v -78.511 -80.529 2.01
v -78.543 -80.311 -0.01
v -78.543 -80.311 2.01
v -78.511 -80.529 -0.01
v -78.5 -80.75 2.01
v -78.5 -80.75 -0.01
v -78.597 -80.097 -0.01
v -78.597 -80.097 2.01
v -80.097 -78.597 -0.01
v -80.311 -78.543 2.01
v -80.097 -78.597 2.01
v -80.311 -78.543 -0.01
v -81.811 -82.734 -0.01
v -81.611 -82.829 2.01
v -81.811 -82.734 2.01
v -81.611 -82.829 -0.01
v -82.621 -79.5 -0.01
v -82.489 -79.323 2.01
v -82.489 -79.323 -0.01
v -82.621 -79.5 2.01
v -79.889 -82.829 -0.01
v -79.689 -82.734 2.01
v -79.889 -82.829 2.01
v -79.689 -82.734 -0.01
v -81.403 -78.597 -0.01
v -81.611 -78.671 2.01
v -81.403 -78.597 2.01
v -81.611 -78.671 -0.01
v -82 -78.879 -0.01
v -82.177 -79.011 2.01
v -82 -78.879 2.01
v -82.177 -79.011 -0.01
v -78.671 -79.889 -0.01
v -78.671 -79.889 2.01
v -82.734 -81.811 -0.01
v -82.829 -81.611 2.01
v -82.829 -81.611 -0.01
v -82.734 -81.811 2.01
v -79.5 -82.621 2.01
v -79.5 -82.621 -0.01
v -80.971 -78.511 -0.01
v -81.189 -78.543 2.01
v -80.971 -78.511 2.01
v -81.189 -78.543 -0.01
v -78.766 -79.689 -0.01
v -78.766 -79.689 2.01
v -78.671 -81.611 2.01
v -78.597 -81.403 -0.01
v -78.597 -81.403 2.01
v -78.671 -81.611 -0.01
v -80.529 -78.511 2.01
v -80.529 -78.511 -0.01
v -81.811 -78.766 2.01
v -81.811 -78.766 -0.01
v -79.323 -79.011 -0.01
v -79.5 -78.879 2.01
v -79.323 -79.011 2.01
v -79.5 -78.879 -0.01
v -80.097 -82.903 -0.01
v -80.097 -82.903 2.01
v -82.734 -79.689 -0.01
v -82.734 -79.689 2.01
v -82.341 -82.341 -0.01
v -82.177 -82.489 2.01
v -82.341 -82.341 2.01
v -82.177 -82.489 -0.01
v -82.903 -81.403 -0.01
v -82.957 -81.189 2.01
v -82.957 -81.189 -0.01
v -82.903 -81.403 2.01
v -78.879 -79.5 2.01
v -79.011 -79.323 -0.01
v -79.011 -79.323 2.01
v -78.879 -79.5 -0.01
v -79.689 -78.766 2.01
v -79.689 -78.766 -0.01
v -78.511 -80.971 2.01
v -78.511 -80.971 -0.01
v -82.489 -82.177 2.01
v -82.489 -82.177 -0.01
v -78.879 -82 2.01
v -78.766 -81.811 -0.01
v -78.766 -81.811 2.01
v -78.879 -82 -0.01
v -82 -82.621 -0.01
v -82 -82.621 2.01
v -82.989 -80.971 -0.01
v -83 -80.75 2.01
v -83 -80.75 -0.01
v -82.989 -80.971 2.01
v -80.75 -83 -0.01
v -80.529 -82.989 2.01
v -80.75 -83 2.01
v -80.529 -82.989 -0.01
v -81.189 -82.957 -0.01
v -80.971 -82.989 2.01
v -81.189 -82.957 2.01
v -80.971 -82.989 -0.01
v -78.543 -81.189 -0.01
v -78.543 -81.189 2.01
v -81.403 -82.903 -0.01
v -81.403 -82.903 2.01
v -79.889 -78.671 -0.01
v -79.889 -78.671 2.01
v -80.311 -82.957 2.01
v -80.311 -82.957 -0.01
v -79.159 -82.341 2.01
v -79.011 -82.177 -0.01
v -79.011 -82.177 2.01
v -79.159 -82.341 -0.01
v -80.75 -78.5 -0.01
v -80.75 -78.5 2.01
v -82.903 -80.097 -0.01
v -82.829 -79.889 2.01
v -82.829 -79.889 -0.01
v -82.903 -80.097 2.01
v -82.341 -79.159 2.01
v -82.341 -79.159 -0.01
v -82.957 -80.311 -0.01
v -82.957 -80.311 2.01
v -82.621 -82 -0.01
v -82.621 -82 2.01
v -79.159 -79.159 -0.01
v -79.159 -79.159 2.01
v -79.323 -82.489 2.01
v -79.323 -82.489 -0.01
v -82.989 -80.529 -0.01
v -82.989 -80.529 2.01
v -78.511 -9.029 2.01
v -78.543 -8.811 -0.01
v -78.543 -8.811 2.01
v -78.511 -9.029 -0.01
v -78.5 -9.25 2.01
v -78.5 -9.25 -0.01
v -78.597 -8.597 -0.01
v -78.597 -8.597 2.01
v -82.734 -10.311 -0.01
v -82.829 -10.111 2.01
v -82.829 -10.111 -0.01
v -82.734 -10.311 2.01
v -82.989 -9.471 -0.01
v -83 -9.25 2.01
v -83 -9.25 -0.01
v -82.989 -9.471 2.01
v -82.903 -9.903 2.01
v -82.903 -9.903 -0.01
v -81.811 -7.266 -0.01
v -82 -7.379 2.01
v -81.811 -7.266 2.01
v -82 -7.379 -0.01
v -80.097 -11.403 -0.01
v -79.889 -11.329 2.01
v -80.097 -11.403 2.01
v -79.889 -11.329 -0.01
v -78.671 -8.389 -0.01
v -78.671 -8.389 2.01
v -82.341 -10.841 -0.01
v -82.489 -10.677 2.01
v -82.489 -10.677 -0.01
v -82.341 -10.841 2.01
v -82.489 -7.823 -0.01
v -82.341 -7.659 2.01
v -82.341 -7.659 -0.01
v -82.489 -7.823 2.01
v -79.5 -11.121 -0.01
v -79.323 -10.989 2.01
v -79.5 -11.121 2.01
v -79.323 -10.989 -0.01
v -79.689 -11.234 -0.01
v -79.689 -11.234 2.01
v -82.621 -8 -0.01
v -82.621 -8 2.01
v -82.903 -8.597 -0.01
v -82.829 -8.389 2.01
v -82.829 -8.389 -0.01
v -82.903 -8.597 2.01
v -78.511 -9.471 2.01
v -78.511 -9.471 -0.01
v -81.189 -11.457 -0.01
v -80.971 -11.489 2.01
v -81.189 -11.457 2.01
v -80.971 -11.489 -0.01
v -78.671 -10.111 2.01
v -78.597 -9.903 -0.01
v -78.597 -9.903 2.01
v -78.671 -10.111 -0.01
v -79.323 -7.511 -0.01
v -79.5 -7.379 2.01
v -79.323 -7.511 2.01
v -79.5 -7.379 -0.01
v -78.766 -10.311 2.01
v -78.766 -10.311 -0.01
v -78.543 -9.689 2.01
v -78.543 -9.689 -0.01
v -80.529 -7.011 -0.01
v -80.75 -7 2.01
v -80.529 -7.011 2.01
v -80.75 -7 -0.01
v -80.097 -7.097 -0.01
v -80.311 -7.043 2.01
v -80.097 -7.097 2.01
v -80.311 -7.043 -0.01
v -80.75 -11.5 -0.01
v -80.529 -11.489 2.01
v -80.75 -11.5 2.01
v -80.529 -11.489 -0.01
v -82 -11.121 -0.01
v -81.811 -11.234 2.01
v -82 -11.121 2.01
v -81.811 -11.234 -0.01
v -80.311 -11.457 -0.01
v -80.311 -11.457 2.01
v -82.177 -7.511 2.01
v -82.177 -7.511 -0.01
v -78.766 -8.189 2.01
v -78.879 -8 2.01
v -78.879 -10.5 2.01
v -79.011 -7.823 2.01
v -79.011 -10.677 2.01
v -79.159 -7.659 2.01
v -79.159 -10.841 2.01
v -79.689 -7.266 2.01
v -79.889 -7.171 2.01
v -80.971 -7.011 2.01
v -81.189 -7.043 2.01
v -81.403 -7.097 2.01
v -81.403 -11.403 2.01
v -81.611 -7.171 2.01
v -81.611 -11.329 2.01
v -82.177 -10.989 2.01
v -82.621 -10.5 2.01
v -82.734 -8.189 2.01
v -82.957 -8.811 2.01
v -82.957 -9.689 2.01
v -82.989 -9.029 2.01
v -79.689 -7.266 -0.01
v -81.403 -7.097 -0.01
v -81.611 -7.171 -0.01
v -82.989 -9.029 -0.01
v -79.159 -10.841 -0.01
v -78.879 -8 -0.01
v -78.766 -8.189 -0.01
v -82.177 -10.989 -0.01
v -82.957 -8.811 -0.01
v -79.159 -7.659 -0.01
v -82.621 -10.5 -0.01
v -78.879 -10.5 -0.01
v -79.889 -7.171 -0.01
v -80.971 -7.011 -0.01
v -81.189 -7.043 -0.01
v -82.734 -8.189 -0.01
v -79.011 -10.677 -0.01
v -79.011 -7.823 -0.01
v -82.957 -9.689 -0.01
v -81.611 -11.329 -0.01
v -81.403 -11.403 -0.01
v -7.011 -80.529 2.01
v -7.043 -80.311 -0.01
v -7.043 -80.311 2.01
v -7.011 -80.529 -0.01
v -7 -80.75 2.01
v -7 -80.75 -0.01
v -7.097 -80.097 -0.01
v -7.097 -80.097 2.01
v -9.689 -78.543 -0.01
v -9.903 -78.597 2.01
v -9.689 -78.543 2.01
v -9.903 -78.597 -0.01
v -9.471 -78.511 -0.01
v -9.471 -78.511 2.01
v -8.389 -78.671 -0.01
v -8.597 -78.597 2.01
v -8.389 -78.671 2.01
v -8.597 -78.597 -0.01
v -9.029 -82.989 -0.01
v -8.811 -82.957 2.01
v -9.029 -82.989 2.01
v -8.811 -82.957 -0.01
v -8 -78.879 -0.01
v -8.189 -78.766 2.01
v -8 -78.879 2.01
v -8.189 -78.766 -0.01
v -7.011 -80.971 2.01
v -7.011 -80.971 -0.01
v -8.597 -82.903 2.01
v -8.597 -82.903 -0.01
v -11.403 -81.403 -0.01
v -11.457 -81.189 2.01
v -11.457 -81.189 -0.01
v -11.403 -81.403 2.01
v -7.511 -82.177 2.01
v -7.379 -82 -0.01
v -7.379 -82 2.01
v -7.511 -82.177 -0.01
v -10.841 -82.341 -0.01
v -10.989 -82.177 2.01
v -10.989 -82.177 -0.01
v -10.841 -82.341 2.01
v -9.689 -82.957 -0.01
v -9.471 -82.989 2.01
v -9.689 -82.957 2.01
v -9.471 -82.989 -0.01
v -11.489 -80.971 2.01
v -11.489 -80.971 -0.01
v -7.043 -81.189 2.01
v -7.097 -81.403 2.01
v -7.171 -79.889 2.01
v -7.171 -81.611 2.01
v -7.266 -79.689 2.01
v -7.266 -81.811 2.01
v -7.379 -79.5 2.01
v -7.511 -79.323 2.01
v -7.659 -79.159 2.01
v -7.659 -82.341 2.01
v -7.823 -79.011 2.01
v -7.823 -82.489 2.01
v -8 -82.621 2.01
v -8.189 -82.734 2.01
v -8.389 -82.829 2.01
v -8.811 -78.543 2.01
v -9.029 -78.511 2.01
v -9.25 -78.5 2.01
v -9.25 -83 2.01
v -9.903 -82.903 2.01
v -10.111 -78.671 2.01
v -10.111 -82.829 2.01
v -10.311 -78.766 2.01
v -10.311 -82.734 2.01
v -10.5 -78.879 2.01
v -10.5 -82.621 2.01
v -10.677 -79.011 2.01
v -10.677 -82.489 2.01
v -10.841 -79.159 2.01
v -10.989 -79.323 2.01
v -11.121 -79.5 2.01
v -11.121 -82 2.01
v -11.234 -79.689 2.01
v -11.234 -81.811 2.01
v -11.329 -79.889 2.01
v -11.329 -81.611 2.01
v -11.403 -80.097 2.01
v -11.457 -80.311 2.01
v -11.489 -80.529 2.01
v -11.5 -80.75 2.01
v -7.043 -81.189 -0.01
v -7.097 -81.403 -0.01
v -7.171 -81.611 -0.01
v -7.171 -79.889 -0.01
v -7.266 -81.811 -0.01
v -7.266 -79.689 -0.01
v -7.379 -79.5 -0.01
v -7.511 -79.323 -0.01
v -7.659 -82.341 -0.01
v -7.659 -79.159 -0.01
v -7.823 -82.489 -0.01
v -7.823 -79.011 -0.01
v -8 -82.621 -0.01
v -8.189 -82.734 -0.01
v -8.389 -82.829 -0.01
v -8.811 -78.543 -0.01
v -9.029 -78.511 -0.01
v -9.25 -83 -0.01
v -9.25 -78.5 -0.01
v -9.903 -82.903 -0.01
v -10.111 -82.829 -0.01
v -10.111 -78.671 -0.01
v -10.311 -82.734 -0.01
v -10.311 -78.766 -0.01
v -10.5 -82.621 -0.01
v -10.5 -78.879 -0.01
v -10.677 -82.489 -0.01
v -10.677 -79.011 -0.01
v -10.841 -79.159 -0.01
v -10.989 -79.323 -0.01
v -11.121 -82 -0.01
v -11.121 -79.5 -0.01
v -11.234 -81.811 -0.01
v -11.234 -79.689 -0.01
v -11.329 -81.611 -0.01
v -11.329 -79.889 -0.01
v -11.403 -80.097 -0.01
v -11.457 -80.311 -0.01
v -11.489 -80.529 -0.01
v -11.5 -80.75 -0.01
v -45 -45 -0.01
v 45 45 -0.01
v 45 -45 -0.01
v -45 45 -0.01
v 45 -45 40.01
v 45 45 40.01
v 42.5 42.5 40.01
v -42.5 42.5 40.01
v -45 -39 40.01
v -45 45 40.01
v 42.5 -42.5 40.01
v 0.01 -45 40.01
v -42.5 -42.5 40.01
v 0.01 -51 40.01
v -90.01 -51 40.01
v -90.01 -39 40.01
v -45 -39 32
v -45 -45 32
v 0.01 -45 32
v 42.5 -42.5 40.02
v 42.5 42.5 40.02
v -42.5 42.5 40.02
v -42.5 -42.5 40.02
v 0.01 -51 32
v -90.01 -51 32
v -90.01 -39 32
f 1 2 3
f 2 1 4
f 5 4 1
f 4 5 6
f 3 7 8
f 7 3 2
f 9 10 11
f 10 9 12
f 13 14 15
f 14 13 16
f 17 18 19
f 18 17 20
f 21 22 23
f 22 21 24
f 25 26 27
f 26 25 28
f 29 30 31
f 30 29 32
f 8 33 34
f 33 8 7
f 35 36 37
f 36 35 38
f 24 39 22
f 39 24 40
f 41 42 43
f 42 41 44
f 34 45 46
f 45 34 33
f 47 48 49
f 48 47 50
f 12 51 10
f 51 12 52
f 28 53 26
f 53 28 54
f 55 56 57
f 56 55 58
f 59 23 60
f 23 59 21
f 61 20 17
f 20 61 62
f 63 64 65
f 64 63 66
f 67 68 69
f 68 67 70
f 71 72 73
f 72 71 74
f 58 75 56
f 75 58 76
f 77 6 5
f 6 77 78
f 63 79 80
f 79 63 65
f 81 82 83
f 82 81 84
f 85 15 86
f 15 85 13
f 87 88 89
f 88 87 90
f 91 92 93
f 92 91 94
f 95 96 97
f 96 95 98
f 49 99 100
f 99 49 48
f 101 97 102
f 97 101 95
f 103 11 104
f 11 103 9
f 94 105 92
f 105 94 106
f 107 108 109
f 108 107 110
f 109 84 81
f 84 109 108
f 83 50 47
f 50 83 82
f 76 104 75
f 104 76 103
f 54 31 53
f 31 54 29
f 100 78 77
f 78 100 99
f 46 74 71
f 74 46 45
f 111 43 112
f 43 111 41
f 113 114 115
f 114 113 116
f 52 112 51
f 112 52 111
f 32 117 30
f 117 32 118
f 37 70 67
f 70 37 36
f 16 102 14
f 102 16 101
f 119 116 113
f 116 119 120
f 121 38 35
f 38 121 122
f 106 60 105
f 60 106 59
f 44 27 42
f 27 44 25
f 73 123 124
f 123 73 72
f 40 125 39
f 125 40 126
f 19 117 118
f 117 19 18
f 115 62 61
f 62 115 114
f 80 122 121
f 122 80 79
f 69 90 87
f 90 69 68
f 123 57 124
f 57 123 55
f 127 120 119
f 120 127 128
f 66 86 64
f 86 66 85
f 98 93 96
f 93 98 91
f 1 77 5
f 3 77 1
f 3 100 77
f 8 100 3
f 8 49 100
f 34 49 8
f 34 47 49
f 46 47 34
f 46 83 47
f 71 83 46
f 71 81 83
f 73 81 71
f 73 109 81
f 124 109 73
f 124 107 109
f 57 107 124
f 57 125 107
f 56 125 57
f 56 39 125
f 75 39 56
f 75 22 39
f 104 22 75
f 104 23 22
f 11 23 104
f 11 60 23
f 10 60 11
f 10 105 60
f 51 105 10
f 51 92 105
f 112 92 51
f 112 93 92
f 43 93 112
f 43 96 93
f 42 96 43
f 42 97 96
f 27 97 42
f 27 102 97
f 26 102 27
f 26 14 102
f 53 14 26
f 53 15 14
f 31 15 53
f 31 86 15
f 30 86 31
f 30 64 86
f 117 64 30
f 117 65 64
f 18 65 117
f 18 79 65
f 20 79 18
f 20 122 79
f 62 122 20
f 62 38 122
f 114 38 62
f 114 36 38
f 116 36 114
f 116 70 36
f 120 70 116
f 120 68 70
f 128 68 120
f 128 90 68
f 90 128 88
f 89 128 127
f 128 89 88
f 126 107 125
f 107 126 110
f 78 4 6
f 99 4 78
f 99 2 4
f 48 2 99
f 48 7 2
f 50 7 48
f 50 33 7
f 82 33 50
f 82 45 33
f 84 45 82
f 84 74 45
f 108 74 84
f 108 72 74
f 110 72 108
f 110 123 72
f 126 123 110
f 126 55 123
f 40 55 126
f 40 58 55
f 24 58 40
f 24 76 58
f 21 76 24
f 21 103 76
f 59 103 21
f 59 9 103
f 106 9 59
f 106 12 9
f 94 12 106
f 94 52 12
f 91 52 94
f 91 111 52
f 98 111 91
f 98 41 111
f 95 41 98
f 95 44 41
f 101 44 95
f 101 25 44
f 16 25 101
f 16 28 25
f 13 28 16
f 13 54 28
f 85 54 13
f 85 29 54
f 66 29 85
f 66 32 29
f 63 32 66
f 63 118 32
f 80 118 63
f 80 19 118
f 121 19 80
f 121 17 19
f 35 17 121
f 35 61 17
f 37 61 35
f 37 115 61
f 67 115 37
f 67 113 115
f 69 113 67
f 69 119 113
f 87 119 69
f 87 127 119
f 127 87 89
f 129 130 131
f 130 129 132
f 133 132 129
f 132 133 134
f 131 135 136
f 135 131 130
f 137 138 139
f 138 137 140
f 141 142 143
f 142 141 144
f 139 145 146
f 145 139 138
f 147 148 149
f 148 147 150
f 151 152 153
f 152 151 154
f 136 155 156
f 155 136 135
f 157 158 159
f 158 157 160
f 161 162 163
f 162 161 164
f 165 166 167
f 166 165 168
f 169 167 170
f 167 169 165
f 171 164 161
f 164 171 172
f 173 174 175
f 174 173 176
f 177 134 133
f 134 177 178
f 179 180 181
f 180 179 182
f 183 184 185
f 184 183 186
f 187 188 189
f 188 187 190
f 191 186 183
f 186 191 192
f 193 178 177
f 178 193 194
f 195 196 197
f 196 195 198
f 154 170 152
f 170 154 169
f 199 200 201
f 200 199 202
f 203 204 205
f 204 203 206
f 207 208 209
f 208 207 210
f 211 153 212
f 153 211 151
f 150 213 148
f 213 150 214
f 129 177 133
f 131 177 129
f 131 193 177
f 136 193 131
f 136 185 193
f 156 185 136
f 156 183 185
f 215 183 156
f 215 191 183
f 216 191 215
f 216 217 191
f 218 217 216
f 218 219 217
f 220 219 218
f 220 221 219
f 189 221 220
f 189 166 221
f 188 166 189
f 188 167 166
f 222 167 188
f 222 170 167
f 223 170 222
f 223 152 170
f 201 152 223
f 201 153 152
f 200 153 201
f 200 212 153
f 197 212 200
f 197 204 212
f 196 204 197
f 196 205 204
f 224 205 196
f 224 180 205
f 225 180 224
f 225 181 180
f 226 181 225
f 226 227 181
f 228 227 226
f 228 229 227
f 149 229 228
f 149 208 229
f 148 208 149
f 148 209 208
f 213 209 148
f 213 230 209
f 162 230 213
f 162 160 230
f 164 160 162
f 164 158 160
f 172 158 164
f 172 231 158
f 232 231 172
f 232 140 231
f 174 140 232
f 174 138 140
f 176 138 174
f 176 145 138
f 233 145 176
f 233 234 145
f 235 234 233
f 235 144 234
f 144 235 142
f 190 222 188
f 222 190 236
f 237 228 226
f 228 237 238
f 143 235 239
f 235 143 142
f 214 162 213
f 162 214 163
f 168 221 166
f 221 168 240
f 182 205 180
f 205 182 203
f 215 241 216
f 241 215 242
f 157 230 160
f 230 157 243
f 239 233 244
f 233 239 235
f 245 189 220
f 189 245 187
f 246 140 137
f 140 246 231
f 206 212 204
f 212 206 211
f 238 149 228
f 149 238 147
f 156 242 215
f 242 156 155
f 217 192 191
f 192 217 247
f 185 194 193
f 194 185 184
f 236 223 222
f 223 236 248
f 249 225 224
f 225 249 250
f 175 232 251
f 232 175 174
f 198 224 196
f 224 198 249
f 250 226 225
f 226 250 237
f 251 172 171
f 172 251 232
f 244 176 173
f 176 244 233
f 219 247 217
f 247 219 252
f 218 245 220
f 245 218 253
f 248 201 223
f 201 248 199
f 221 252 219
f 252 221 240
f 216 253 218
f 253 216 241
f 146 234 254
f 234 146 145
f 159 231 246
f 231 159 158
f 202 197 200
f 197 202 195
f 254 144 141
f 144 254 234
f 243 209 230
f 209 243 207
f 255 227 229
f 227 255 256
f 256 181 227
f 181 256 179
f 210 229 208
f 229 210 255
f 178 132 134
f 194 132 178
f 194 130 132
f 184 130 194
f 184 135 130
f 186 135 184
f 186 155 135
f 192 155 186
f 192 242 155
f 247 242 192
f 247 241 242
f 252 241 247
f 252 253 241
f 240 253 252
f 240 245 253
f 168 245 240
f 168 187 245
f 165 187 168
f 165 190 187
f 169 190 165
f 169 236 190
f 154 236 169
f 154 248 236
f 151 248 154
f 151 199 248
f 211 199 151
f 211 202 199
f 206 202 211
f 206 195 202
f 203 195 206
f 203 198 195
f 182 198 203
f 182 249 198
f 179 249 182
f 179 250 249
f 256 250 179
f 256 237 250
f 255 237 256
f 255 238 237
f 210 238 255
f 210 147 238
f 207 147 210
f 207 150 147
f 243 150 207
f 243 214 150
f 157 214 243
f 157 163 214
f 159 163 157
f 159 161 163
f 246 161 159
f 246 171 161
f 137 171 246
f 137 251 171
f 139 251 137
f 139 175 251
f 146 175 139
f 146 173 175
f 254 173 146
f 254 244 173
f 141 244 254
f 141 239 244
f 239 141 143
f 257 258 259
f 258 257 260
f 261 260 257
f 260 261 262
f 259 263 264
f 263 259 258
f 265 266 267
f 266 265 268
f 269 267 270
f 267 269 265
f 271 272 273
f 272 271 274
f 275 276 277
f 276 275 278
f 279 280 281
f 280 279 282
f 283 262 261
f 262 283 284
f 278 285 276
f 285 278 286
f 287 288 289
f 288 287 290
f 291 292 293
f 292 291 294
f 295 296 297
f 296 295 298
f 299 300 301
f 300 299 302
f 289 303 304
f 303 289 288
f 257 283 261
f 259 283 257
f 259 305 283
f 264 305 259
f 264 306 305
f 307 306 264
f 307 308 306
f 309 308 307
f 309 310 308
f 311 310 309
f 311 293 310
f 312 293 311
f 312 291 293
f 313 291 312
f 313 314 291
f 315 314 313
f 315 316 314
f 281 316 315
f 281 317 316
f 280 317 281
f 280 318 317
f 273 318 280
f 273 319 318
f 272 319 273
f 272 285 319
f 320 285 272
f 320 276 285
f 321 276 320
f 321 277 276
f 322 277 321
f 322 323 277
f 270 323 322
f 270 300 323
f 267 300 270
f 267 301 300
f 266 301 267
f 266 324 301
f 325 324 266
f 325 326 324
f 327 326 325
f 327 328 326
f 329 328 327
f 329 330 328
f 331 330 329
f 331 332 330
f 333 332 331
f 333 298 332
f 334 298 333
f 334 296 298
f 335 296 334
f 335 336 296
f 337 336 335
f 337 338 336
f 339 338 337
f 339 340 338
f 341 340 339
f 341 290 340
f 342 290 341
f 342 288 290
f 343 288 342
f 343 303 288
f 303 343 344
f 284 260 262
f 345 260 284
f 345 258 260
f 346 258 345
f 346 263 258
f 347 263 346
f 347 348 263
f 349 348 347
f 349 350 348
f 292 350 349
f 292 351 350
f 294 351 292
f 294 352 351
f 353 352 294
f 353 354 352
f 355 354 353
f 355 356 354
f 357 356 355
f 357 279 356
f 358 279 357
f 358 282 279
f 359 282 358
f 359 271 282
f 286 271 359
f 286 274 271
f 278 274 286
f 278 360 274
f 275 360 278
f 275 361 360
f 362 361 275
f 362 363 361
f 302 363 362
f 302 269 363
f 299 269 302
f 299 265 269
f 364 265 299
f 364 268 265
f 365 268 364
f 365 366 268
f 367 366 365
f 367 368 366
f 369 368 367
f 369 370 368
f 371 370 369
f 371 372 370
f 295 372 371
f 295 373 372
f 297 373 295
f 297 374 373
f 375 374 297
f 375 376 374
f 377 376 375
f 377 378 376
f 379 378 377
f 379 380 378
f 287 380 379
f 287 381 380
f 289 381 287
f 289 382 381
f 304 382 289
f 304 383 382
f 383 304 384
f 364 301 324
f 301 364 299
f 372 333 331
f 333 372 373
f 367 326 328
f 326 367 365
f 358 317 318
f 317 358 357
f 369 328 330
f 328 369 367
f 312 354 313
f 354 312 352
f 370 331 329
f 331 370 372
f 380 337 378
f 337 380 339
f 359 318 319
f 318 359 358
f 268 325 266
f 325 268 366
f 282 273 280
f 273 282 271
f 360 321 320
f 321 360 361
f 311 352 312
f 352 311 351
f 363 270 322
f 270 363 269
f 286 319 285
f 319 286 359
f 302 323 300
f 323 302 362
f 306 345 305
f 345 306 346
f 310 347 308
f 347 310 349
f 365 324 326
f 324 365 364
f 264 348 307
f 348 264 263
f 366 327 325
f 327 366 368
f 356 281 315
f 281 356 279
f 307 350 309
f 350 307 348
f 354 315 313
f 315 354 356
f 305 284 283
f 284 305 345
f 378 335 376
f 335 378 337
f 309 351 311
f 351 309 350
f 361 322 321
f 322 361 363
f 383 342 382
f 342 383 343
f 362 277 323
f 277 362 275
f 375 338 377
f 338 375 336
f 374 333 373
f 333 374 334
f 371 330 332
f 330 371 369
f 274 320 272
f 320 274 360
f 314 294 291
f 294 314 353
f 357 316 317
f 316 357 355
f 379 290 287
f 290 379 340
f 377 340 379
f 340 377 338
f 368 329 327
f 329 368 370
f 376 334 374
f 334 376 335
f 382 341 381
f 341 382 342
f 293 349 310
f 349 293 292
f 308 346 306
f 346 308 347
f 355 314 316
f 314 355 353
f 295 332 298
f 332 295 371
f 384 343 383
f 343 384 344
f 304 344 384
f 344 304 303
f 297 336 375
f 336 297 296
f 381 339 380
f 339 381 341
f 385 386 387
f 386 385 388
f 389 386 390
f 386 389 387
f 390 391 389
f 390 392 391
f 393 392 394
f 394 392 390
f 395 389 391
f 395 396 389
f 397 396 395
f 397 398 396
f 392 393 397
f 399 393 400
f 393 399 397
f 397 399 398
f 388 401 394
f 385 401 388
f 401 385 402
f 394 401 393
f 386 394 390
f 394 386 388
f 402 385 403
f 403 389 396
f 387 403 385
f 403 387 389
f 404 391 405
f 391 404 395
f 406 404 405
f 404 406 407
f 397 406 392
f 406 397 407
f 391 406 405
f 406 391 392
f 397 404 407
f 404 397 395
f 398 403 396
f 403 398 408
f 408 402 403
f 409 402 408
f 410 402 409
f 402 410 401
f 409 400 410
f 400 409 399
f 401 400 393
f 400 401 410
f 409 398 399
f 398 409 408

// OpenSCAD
// DIY Magnetic Stirrer Housing
// Dimensions in mm

// Main dimensions
outer_size = 90;
wall_thickness = 2.5;
top_thickness = 2;
height = 40;

// Screw hole pattern
screw_hole_diameter = 4.5;
screw_pattern_size = 71.5;
screw_pattern_offset = screw_pattern_size / 2;

// Cable notch dimensions
notch_width = 12;
notch_depth = 8; // from top (z = height - notch_depth to height)
notch_z_start = height - notch_depth;

// Compute inner dimensions
inner_size = outer_size - 2 * wall_thickness;

// Resolution
$fn = 64;

module stirrer_housing() {
    // Main outer box (centered on origin at base)
    translate([0, 0, -0.01]) 
        cube([outer_size, outer_size, height + 0.02]);
    
    // Hollow out the interior (walls + top)
    translate([wall_thickness, wall_thickness, top_thickness]) 
        cube([inner_size, inner_size, height - top_thickness + 0.02]);
    
    // Remove everything above top plate except the top surface
    translate([0, 0, height]) 
        cube([outer_size, outer_size, 0.01]);
    
    // Screw holes in top plate (4 holes on 71.5mm square pattern)
    for (i = [-1, 1]) {
        for (j = [-1, 1]) {
            translate([
                screw_pattern_offset * i,
                screw_pattern_offset * j,
                -0.01
            ]) {
                cylinder(h = top_thickness + 0.02, r = screw_hole_diameter / 2);
            }
        }
    }
    
    // Cable notch in one wall (front wall, centered in X, at Y = -outer_size/2)
    // Front wall is at Y = -outer_size/2
    translate([
        -outer_size / 2 - 0.01,  // extend past wall
        -notch_width / 2,
        notch_z_start
    ]) {
        cube([
            outer_size + 0.02,  // full width
            notch_width,
            notch_depth + 0.01
        ]);
    }
}

// Center the part properly - the part should be centered on origin
// The base should be at z=0, and the part should be centered in X and Y
translate([-outer_size/2, -outer_size/2, 0])
    stirrer_housing();
